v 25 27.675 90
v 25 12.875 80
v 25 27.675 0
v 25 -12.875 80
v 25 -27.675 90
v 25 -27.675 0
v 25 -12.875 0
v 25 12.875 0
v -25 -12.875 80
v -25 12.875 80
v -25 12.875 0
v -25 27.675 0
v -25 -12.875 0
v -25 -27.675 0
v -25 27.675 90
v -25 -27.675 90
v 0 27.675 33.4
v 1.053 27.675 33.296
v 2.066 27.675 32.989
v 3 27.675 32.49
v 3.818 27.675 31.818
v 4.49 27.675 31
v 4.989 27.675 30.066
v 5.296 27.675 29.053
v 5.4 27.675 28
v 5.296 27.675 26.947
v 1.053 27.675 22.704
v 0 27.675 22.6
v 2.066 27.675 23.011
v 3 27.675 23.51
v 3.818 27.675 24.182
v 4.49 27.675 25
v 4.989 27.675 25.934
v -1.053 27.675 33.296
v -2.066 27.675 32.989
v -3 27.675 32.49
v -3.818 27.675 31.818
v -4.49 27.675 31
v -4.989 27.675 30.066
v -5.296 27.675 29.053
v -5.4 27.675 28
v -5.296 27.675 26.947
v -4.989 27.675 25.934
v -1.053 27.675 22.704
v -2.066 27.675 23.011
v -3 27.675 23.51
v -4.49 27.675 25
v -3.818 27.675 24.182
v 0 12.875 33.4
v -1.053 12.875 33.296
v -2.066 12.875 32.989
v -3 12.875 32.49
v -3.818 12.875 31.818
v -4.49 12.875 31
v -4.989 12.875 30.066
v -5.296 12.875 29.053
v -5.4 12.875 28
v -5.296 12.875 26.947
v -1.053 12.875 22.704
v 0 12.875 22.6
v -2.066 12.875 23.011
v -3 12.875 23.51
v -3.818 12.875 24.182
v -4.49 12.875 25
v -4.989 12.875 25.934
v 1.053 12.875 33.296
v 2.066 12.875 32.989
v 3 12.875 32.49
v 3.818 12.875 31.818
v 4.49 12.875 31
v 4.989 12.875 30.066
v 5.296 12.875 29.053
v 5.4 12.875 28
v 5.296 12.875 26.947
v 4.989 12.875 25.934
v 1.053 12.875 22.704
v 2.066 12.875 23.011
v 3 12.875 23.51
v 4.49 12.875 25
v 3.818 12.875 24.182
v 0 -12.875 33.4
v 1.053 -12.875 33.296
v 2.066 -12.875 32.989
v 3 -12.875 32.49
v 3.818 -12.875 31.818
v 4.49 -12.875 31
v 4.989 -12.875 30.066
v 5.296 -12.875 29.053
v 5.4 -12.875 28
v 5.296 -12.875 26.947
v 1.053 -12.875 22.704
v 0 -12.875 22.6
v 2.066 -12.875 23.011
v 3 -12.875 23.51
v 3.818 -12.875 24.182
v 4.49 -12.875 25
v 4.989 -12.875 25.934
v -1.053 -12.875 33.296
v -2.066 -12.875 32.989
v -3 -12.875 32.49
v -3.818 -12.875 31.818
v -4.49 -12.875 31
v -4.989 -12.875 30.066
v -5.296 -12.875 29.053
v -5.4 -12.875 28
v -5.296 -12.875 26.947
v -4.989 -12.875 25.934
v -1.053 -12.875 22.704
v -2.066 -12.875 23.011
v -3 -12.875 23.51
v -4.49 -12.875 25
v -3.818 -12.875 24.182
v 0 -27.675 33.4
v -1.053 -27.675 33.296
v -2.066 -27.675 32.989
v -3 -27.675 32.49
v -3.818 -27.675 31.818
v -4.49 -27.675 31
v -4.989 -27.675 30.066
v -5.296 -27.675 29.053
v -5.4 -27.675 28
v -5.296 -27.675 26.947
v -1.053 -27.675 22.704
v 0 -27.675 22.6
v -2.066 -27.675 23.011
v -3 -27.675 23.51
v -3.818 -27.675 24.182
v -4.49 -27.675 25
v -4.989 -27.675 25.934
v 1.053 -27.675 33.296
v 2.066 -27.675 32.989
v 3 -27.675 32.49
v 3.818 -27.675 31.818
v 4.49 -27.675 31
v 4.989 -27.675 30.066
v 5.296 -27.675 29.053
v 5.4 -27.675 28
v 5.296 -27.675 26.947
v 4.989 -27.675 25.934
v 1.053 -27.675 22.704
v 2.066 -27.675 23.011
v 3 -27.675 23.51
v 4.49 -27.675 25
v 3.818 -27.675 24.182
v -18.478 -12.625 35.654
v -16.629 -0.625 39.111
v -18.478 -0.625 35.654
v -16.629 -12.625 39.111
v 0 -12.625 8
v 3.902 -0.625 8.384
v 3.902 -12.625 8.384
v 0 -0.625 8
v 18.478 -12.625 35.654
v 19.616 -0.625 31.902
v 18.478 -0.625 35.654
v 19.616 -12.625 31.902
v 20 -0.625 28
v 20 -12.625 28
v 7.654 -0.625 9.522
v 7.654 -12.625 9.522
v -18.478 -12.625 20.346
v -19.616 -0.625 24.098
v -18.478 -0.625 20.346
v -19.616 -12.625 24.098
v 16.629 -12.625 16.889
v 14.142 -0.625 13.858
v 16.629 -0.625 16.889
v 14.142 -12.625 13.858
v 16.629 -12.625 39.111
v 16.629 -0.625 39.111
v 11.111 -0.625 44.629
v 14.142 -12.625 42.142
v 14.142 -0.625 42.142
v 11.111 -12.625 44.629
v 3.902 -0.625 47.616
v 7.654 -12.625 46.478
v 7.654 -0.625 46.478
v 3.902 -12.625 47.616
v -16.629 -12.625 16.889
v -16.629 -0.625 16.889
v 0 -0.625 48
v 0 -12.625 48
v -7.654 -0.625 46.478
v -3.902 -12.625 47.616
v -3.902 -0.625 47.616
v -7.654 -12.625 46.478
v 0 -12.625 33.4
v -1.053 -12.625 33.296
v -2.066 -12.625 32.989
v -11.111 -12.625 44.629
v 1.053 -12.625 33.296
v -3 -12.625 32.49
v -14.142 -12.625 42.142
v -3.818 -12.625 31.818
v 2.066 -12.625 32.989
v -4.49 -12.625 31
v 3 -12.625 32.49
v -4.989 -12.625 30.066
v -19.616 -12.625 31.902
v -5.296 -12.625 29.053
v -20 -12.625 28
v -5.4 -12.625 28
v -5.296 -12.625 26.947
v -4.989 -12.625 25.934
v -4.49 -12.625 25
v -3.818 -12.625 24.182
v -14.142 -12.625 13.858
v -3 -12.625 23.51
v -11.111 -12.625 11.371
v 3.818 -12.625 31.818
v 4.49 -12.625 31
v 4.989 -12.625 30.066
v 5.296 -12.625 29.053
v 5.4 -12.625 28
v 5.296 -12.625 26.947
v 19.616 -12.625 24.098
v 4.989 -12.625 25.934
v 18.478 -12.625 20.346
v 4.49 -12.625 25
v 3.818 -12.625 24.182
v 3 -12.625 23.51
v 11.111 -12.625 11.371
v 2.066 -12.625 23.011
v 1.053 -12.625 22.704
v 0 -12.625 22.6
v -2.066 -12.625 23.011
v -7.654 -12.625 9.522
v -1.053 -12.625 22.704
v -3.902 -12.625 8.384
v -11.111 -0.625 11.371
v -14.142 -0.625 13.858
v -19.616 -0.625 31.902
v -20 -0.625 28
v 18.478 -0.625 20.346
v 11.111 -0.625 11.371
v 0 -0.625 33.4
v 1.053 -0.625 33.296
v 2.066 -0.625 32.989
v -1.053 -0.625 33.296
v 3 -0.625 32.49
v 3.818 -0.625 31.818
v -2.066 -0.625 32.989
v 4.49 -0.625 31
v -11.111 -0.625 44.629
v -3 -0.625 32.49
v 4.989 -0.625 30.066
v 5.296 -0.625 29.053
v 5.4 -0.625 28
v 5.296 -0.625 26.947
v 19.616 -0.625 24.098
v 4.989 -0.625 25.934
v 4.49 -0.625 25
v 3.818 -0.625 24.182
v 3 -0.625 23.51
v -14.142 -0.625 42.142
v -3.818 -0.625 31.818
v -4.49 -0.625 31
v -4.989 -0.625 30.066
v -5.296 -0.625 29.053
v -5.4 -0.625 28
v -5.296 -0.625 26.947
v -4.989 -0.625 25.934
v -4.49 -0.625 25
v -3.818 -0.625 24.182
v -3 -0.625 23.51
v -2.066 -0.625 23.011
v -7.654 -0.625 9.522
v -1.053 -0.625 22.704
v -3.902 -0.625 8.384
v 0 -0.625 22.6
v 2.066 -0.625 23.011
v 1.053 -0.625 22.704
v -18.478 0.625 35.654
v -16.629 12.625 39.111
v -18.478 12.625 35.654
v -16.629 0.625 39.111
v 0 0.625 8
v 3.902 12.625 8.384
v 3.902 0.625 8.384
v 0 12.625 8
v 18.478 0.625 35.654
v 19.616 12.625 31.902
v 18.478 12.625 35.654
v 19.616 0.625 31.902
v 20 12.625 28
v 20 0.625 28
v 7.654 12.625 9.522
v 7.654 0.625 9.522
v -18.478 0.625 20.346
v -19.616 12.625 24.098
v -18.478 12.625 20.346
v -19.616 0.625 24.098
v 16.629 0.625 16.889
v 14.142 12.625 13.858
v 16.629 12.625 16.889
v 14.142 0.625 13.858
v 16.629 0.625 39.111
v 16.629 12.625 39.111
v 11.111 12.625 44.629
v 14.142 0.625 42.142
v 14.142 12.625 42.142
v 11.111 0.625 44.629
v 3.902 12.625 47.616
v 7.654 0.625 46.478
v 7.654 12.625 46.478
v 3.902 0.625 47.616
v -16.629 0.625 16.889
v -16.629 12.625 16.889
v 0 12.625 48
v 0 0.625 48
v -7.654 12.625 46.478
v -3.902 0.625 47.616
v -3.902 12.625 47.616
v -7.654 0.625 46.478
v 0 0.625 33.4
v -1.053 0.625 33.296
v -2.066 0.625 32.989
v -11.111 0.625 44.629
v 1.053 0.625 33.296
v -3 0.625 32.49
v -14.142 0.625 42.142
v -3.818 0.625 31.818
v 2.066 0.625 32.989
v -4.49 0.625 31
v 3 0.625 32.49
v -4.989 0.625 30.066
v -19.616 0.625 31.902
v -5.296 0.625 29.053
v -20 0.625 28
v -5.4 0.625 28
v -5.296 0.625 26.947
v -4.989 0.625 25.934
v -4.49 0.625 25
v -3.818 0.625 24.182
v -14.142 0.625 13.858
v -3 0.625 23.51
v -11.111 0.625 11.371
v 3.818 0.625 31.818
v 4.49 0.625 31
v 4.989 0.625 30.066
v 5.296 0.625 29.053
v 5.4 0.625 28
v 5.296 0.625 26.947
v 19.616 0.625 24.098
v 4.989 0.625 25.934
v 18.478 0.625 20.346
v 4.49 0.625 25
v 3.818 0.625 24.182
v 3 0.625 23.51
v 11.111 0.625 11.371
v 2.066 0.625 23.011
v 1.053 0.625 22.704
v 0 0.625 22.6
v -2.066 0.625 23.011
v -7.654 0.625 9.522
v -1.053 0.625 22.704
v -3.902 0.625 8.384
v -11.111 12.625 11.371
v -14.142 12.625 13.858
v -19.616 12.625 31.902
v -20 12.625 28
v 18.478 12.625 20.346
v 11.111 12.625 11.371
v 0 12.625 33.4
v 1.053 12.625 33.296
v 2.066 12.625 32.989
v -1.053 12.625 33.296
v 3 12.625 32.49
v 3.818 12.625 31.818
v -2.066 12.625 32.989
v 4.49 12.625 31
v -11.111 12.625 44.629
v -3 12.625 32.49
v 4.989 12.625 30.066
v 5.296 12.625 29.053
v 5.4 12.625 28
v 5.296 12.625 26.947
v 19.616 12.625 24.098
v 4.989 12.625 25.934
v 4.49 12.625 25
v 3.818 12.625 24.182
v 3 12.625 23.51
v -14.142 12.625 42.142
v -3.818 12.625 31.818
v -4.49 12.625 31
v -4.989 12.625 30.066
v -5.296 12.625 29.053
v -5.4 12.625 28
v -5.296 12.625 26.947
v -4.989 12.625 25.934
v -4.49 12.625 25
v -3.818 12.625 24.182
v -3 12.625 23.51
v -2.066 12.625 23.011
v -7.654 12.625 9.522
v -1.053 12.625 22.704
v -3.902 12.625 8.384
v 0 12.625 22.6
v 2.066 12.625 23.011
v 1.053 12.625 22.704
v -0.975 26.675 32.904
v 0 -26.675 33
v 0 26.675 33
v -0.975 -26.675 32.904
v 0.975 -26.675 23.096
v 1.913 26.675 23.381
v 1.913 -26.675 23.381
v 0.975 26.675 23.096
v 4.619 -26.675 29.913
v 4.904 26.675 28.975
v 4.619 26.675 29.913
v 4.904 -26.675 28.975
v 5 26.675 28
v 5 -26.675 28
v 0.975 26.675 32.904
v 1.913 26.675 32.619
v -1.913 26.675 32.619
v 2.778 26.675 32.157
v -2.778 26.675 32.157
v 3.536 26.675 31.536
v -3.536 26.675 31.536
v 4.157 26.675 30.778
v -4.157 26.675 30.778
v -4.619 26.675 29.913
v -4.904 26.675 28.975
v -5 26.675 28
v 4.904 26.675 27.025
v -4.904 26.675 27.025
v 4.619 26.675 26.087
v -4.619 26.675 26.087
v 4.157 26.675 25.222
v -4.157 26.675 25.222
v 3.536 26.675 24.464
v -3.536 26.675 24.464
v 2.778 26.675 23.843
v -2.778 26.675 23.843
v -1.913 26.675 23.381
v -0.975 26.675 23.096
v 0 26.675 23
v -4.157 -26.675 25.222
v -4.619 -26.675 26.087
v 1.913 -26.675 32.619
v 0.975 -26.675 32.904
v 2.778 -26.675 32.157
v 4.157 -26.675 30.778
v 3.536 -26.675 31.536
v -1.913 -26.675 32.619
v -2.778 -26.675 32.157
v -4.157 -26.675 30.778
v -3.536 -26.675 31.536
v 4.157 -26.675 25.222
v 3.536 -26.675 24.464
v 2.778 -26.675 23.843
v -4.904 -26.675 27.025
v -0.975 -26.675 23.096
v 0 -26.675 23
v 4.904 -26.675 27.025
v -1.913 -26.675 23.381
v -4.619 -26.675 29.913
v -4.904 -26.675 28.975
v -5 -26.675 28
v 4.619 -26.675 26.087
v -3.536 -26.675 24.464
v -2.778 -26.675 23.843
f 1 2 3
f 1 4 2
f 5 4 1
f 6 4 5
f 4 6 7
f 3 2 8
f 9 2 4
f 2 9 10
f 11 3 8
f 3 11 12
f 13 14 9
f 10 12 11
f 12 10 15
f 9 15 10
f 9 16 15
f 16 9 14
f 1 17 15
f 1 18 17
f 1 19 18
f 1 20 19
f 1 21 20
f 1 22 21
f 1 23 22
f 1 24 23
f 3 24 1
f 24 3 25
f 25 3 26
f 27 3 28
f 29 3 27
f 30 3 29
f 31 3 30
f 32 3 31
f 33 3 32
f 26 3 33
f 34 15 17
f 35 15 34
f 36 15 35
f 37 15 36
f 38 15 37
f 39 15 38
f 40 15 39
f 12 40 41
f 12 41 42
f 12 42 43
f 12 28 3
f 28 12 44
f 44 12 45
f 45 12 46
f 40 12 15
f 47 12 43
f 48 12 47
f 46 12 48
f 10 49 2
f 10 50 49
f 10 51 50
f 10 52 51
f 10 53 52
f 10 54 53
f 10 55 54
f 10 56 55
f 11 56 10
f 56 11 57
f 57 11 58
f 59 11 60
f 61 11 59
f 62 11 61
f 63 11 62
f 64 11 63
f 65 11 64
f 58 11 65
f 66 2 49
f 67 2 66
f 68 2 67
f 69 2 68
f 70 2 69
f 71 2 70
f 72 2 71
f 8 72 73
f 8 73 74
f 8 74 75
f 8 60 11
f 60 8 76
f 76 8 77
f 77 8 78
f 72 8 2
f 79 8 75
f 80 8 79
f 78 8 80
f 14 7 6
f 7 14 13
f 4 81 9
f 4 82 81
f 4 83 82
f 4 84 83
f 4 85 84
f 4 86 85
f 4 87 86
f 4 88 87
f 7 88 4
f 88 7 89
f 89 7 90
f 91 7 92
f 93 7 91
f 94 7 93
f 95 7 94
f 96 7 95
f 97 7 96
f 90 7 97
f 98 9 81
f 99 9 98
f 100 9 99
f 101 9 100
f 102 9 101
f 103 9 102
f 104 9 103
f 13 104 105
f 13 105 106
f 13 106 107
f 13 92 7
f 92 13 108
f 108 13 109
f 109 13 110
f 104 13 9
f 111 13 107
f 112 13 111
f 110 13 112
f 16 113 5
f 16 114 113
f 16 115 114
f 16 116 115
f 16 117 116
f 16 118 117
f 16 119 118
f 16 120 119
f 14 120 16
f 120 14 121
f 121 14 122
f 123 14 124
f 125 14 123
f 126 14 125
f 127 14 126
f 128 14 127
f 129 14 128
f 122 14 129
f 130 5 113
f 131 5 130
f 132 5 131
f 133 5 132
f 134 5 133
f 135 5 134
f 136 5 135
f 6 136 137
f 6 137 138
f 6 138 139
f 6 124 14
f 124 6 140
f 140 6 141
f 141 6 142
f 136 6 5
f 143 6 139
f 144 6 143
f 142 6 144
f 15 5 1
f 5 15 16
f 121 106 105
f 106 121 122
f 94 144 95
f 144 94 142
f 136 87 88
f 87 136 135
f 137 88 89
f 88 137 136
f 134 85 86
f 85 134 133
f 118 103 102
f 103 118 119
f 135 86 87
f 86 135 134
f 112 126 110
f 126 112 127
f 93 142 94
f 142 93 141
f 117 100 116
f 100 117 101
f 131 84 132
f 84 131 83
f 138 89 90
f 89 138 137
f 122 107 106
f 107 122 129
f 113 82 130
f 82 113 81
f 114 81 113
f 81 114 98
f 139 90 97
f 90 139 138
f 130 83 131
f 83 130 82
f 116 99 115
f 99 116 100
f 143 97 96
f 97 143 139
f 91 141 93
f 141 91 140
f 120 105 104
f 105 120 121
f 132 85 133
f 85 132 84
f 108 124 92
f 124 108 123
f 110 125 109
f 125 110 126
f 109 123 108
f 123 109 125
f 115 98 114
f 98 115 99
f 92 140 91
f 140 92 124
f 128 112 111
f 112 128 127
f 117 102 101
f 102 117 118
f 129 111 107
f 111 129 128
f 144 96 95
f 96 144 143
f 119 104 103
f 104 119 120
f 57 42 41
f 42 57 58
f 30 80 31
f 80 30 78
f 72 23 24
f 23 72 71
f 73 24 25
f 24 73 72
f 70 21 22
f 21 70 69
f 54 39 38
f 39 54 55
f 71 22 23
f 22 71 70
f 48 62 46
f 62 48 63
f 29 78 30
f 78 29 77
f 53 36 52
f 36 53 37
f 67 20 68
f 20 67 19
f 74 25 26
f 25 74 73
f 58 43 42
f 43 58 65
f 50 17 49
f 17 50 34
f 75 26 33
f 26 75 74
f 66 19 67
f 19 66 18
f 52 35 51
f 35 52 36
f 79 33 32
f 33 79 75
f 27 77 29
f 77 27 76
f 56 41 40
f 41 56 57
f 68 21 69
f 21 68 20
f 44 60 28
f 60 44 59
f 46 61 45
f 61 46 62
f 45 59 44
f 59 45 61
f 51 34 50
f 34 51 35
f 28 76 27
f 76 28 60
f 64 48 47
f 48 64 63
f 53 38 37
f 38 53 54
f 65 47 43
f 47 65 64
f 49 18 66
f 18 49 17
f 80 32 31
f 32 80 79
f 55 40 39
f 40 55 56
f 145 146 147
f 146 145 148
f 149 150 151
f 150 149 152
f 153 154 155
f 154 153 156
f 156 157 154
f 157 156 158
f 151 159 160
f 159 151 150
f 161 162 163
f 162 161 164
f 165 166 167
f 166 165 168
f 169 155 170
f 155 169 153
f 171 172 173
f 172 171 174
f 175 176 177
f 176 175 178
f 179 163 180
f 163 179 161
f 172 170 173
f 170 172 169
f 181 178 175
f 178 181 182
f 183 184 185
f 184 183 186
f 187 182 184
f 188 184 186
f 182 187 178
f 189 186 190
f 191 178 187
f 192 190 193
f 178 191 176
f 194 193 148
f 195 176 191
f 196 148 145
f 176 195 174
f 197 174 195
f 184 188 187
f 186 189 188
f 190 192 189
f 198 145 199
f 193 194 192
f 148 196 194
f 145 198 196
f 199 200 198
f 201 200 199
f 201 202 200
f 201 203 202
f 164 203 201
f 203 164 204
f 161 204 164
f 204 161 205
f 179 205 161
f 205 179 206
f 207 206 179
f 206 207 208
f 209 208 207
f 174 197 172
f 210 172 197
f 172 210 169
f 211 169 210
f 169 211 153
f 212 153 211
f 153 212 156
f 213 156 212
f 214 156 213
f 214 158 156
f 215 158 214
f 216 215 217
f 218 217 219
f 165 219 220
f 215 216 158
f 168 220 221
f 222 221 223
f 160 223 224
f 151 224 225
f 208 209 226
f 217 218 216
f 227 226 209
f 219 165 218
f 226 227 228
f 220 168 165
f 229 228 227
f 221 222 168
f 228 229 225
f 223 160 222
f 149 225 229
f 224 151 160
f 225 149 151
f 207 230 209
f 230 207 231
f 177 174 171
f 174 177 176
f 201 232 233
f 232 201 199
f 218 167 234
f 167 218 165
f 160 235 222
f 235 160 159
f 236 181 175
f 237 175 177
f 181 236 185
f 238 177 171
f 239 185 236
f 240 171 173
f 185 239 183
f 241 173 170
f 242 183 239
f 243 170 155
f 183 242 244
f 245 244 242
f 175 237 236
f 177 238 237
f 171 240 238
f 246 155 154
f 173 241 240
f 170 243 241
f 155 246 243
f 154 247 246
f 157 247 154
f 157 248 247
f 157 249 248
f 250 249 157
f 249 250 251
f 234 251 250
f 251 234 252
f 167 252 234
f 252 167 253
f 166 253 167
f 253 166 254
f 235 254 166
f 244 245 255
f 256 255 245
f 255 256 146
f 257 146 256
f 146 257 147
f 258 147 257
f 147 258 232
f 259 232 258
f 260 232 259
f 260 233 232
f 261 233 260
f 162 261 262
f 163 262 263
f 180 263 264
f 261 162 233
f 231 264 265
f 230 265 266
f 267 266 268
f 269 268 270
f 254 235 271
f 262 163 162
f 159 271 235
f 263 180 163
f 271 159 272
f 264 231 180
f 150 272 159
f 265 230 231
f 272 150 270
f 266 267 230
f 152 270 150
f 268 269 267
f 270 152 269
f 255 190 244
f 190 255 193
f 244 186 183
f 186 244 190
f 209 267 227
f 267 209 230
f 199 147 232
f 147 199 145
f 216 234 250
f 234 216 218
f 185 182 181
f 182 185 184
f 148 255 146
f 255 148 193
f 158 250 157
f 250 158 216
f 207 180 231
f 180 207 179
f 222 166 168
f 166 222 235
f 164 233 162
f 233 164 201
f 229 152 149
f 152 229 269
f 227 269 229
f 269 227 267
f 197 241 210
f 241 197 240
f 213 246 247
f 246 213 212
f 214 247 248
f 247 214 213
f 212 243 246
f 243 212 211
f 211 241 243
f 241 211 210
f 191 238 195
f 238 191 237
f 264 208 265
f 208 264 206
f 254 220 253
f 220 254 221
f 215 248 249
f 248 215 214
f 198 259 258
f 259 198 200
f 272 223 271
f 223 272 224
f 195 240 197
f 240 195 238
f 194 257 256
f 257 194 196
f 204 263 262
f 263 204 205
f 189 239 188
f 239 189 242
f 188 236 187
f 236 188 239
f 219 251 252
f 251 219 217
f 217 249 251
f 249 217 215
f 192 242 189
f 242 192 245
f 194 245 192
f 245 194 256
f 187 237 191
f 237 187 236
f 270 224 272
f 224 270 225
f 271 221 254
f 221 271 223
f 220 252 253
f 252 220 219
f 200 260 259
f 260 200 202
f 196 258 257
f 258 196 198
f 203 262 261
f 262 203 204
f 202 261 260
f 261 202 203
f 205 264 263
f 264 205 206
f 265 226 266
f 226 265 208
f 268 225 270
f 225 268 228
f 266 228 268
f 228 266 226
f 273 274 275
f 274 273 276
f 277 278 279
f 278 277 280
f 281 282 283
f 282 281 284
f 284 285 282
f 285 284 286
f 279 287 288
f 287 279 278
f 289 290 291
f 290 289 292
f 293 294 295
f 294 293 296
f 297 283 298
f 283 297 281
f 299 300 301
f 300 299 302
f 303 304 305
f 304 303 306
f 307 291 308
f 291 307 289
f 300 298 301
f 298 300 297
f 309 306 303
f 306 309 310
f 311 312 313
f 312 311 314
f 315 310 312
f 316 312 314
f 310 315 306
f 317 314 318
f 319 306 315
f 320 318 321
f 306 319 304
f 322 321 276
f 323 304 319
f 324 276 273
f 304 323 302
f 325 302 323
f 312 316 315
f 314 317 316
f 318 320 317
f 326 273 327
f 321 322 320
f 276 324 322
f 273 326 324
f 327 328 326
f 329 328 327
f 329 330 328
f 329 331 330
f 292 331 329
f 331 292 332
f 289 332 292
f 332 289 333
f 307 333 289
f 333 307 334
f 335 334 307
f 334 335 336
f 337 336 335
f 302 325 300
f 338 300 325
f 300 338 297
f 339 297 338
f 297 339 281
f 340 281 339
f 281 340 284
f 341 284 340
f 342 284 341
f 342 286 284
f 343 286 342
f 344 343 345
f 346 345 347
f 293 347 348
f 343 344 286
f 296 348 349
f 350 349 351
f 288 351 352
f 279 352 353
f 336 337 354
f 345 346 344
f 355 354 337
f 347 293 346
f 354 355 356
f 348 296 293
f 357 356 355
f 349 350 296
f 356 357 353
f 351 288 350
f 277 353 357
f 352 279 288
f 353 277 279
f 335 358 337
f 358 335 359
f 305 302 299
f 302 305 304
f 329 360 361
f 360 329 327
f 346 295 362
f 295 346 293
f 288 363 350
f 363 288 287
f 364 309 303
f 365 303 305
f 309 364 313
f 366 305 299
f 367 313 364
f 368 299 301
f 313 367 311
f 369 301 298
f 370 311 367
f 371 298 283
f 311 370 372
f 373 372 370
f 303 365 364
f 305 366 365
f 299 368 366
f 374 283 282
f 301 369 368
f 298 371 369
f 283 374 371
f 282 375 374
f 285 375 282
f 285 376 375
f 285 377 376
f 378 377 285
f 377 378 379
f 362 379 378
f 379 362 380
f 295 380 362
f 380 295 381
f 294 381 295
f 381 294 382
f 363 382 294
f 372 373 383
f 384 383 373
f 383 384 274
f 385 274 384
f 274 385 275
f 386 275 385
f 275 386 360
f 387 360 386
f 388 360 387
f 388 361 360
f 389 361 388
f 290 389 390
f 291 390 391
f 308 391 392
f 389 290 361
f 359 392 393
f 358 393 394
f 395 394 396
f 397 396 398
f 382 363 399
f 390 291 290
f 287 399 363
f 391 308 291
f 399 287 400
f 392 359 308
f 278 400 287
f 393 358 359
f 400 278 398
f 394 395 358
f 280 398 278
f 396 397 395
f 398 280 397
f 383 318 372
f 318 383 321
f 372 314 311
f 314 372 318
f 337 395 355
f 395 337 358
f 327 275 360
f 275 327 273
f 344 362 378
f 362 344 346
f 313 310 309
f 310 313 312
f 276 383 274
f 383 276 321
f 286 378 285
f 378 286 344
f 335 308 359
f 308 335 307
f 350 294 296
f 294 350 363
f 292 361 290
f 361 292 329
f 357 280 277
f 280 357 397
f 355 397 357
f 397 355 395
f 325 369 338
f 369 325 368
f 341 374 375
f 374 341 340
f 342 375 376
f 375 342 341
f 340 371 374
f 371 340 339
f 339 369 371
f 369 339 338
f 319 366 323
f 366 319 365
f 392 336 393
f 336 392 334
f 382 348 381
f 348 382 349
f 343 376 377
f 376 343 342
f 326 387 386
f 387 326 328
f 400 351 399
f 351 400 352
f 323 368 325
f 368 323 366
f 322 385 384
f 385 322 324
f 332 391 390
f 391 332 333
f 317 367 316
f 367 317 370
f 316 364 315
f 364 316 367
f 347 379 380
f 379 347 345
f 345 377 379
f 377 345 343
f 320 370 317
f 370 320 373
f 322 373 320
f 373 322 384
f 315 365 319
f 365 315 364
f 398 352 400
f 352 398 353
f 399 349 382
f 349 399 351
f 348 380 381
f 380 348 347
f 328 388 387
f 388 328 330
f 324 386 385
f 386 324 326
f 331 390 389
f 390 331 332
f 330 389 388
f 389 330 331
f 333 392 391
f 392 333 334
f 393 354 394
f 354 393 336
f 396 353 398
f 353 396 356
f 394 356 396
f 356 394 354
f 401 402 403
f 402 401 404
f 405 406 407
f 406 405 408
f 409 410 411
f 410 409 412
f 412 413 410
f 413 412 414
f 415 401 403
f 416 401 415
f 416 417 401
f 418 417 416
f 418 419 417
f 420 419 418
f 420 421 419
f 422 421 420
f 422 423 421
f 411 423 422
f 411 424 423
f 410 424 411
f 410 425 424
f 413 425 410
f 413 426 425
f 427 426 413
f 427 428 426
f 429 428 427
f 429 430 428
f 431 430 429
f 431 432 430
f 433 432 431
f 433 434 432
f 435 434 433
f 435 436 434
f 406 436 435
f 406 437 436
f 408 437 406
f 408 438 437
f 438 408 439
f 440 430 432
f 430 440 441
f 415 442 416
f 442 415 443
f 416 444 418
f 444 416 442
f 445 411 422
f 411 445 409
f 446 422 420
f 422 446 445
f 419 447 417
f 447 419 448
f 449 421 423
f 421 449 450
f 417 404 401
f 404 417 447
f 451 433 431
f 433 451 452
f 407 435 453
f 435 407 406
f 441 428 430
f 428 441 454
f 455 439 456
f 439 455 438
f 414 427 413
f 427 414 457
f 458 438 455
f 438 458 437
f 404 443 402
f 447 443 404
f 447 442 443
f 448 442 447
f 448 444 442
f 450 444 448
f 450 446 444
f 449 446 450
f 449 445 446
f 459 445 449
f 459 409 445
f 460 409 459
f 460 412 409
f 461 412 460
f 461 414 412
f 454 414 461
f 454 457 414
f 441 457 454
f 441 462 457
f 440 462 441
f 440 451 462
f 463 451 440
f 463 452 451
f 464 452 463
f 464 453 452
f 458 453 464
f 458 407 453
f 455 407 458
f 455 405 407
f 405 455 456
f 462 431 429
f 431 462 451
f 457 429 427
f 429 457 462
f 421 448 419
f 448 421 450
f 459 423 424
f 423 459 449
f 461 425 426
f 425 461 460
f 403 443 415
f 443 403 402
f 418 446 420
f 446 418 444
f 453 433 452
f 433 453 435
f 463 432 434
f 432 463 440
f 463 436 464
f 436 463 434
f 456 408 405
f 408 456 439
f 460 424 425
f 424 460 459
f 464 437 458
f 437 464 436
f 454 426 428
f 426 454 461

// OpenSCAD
$fn = 32;

// ------------------------------------------------------------------------
// Trolley wheel set: wheels d40, fork 80 mm tall
// Every part is its own module, assembly() places every instance.
// ------------------------------------------------------------------------

// --- part 1 ---
module trolley_fork() {
  difference() {
    union() {
      translate([-25, 12.875, 0]) cube([50, 14.8, 80]);
      translate([-25, -27.675, 0]) cube([50, 14.8, 80]);
      translate([-25, -27.675, 80]) cube([50, 55.35, 10]);
    }
    translate([0, -20.275, 28]) rotate([90, 0, 0]) cylinder(h = 16.8, d = 10.8, center = true);
    translate([0, 20.275, 28]) rotate([90, 0, 0]) cylinder(h = 16.8, d = 10.8, center = true);
  }
}

// --- part 2 ---
module trolley_wheel() {
  difference() {
      translate([0, 0, 0]) cylinder(h = 12, d = 40);
      translate([0, 0, -1]) cylinder(h = 14, d = 10.8);
    }
}

// --- part 3 ---
module trolley_axle() {
  translate([0, 0, -26.675]) cylinder(h = 53.35, d = 10);
}

// --- assembly ---
module assembly() {
  color([0.80, 0.24, 0.20]) translate([0, 0, 0]) rotate([0, 0, 0]) trolley_fork();
  color([0.20, 0.45, 0.75]) translate([0, -0.625, 28]) rotate([90, 0, 0]) trolley_wheel();
  color([0.25, 0.62, 0.32]) translate([0, 12.625, 28]) rotate([90, 0, 0]) trolley_wheel();
  color([0.92, 0.70, 0.18]) translate([0, 0, 28]) rotate([90, 0, 0]) trolley_axle();
}

assembly();
